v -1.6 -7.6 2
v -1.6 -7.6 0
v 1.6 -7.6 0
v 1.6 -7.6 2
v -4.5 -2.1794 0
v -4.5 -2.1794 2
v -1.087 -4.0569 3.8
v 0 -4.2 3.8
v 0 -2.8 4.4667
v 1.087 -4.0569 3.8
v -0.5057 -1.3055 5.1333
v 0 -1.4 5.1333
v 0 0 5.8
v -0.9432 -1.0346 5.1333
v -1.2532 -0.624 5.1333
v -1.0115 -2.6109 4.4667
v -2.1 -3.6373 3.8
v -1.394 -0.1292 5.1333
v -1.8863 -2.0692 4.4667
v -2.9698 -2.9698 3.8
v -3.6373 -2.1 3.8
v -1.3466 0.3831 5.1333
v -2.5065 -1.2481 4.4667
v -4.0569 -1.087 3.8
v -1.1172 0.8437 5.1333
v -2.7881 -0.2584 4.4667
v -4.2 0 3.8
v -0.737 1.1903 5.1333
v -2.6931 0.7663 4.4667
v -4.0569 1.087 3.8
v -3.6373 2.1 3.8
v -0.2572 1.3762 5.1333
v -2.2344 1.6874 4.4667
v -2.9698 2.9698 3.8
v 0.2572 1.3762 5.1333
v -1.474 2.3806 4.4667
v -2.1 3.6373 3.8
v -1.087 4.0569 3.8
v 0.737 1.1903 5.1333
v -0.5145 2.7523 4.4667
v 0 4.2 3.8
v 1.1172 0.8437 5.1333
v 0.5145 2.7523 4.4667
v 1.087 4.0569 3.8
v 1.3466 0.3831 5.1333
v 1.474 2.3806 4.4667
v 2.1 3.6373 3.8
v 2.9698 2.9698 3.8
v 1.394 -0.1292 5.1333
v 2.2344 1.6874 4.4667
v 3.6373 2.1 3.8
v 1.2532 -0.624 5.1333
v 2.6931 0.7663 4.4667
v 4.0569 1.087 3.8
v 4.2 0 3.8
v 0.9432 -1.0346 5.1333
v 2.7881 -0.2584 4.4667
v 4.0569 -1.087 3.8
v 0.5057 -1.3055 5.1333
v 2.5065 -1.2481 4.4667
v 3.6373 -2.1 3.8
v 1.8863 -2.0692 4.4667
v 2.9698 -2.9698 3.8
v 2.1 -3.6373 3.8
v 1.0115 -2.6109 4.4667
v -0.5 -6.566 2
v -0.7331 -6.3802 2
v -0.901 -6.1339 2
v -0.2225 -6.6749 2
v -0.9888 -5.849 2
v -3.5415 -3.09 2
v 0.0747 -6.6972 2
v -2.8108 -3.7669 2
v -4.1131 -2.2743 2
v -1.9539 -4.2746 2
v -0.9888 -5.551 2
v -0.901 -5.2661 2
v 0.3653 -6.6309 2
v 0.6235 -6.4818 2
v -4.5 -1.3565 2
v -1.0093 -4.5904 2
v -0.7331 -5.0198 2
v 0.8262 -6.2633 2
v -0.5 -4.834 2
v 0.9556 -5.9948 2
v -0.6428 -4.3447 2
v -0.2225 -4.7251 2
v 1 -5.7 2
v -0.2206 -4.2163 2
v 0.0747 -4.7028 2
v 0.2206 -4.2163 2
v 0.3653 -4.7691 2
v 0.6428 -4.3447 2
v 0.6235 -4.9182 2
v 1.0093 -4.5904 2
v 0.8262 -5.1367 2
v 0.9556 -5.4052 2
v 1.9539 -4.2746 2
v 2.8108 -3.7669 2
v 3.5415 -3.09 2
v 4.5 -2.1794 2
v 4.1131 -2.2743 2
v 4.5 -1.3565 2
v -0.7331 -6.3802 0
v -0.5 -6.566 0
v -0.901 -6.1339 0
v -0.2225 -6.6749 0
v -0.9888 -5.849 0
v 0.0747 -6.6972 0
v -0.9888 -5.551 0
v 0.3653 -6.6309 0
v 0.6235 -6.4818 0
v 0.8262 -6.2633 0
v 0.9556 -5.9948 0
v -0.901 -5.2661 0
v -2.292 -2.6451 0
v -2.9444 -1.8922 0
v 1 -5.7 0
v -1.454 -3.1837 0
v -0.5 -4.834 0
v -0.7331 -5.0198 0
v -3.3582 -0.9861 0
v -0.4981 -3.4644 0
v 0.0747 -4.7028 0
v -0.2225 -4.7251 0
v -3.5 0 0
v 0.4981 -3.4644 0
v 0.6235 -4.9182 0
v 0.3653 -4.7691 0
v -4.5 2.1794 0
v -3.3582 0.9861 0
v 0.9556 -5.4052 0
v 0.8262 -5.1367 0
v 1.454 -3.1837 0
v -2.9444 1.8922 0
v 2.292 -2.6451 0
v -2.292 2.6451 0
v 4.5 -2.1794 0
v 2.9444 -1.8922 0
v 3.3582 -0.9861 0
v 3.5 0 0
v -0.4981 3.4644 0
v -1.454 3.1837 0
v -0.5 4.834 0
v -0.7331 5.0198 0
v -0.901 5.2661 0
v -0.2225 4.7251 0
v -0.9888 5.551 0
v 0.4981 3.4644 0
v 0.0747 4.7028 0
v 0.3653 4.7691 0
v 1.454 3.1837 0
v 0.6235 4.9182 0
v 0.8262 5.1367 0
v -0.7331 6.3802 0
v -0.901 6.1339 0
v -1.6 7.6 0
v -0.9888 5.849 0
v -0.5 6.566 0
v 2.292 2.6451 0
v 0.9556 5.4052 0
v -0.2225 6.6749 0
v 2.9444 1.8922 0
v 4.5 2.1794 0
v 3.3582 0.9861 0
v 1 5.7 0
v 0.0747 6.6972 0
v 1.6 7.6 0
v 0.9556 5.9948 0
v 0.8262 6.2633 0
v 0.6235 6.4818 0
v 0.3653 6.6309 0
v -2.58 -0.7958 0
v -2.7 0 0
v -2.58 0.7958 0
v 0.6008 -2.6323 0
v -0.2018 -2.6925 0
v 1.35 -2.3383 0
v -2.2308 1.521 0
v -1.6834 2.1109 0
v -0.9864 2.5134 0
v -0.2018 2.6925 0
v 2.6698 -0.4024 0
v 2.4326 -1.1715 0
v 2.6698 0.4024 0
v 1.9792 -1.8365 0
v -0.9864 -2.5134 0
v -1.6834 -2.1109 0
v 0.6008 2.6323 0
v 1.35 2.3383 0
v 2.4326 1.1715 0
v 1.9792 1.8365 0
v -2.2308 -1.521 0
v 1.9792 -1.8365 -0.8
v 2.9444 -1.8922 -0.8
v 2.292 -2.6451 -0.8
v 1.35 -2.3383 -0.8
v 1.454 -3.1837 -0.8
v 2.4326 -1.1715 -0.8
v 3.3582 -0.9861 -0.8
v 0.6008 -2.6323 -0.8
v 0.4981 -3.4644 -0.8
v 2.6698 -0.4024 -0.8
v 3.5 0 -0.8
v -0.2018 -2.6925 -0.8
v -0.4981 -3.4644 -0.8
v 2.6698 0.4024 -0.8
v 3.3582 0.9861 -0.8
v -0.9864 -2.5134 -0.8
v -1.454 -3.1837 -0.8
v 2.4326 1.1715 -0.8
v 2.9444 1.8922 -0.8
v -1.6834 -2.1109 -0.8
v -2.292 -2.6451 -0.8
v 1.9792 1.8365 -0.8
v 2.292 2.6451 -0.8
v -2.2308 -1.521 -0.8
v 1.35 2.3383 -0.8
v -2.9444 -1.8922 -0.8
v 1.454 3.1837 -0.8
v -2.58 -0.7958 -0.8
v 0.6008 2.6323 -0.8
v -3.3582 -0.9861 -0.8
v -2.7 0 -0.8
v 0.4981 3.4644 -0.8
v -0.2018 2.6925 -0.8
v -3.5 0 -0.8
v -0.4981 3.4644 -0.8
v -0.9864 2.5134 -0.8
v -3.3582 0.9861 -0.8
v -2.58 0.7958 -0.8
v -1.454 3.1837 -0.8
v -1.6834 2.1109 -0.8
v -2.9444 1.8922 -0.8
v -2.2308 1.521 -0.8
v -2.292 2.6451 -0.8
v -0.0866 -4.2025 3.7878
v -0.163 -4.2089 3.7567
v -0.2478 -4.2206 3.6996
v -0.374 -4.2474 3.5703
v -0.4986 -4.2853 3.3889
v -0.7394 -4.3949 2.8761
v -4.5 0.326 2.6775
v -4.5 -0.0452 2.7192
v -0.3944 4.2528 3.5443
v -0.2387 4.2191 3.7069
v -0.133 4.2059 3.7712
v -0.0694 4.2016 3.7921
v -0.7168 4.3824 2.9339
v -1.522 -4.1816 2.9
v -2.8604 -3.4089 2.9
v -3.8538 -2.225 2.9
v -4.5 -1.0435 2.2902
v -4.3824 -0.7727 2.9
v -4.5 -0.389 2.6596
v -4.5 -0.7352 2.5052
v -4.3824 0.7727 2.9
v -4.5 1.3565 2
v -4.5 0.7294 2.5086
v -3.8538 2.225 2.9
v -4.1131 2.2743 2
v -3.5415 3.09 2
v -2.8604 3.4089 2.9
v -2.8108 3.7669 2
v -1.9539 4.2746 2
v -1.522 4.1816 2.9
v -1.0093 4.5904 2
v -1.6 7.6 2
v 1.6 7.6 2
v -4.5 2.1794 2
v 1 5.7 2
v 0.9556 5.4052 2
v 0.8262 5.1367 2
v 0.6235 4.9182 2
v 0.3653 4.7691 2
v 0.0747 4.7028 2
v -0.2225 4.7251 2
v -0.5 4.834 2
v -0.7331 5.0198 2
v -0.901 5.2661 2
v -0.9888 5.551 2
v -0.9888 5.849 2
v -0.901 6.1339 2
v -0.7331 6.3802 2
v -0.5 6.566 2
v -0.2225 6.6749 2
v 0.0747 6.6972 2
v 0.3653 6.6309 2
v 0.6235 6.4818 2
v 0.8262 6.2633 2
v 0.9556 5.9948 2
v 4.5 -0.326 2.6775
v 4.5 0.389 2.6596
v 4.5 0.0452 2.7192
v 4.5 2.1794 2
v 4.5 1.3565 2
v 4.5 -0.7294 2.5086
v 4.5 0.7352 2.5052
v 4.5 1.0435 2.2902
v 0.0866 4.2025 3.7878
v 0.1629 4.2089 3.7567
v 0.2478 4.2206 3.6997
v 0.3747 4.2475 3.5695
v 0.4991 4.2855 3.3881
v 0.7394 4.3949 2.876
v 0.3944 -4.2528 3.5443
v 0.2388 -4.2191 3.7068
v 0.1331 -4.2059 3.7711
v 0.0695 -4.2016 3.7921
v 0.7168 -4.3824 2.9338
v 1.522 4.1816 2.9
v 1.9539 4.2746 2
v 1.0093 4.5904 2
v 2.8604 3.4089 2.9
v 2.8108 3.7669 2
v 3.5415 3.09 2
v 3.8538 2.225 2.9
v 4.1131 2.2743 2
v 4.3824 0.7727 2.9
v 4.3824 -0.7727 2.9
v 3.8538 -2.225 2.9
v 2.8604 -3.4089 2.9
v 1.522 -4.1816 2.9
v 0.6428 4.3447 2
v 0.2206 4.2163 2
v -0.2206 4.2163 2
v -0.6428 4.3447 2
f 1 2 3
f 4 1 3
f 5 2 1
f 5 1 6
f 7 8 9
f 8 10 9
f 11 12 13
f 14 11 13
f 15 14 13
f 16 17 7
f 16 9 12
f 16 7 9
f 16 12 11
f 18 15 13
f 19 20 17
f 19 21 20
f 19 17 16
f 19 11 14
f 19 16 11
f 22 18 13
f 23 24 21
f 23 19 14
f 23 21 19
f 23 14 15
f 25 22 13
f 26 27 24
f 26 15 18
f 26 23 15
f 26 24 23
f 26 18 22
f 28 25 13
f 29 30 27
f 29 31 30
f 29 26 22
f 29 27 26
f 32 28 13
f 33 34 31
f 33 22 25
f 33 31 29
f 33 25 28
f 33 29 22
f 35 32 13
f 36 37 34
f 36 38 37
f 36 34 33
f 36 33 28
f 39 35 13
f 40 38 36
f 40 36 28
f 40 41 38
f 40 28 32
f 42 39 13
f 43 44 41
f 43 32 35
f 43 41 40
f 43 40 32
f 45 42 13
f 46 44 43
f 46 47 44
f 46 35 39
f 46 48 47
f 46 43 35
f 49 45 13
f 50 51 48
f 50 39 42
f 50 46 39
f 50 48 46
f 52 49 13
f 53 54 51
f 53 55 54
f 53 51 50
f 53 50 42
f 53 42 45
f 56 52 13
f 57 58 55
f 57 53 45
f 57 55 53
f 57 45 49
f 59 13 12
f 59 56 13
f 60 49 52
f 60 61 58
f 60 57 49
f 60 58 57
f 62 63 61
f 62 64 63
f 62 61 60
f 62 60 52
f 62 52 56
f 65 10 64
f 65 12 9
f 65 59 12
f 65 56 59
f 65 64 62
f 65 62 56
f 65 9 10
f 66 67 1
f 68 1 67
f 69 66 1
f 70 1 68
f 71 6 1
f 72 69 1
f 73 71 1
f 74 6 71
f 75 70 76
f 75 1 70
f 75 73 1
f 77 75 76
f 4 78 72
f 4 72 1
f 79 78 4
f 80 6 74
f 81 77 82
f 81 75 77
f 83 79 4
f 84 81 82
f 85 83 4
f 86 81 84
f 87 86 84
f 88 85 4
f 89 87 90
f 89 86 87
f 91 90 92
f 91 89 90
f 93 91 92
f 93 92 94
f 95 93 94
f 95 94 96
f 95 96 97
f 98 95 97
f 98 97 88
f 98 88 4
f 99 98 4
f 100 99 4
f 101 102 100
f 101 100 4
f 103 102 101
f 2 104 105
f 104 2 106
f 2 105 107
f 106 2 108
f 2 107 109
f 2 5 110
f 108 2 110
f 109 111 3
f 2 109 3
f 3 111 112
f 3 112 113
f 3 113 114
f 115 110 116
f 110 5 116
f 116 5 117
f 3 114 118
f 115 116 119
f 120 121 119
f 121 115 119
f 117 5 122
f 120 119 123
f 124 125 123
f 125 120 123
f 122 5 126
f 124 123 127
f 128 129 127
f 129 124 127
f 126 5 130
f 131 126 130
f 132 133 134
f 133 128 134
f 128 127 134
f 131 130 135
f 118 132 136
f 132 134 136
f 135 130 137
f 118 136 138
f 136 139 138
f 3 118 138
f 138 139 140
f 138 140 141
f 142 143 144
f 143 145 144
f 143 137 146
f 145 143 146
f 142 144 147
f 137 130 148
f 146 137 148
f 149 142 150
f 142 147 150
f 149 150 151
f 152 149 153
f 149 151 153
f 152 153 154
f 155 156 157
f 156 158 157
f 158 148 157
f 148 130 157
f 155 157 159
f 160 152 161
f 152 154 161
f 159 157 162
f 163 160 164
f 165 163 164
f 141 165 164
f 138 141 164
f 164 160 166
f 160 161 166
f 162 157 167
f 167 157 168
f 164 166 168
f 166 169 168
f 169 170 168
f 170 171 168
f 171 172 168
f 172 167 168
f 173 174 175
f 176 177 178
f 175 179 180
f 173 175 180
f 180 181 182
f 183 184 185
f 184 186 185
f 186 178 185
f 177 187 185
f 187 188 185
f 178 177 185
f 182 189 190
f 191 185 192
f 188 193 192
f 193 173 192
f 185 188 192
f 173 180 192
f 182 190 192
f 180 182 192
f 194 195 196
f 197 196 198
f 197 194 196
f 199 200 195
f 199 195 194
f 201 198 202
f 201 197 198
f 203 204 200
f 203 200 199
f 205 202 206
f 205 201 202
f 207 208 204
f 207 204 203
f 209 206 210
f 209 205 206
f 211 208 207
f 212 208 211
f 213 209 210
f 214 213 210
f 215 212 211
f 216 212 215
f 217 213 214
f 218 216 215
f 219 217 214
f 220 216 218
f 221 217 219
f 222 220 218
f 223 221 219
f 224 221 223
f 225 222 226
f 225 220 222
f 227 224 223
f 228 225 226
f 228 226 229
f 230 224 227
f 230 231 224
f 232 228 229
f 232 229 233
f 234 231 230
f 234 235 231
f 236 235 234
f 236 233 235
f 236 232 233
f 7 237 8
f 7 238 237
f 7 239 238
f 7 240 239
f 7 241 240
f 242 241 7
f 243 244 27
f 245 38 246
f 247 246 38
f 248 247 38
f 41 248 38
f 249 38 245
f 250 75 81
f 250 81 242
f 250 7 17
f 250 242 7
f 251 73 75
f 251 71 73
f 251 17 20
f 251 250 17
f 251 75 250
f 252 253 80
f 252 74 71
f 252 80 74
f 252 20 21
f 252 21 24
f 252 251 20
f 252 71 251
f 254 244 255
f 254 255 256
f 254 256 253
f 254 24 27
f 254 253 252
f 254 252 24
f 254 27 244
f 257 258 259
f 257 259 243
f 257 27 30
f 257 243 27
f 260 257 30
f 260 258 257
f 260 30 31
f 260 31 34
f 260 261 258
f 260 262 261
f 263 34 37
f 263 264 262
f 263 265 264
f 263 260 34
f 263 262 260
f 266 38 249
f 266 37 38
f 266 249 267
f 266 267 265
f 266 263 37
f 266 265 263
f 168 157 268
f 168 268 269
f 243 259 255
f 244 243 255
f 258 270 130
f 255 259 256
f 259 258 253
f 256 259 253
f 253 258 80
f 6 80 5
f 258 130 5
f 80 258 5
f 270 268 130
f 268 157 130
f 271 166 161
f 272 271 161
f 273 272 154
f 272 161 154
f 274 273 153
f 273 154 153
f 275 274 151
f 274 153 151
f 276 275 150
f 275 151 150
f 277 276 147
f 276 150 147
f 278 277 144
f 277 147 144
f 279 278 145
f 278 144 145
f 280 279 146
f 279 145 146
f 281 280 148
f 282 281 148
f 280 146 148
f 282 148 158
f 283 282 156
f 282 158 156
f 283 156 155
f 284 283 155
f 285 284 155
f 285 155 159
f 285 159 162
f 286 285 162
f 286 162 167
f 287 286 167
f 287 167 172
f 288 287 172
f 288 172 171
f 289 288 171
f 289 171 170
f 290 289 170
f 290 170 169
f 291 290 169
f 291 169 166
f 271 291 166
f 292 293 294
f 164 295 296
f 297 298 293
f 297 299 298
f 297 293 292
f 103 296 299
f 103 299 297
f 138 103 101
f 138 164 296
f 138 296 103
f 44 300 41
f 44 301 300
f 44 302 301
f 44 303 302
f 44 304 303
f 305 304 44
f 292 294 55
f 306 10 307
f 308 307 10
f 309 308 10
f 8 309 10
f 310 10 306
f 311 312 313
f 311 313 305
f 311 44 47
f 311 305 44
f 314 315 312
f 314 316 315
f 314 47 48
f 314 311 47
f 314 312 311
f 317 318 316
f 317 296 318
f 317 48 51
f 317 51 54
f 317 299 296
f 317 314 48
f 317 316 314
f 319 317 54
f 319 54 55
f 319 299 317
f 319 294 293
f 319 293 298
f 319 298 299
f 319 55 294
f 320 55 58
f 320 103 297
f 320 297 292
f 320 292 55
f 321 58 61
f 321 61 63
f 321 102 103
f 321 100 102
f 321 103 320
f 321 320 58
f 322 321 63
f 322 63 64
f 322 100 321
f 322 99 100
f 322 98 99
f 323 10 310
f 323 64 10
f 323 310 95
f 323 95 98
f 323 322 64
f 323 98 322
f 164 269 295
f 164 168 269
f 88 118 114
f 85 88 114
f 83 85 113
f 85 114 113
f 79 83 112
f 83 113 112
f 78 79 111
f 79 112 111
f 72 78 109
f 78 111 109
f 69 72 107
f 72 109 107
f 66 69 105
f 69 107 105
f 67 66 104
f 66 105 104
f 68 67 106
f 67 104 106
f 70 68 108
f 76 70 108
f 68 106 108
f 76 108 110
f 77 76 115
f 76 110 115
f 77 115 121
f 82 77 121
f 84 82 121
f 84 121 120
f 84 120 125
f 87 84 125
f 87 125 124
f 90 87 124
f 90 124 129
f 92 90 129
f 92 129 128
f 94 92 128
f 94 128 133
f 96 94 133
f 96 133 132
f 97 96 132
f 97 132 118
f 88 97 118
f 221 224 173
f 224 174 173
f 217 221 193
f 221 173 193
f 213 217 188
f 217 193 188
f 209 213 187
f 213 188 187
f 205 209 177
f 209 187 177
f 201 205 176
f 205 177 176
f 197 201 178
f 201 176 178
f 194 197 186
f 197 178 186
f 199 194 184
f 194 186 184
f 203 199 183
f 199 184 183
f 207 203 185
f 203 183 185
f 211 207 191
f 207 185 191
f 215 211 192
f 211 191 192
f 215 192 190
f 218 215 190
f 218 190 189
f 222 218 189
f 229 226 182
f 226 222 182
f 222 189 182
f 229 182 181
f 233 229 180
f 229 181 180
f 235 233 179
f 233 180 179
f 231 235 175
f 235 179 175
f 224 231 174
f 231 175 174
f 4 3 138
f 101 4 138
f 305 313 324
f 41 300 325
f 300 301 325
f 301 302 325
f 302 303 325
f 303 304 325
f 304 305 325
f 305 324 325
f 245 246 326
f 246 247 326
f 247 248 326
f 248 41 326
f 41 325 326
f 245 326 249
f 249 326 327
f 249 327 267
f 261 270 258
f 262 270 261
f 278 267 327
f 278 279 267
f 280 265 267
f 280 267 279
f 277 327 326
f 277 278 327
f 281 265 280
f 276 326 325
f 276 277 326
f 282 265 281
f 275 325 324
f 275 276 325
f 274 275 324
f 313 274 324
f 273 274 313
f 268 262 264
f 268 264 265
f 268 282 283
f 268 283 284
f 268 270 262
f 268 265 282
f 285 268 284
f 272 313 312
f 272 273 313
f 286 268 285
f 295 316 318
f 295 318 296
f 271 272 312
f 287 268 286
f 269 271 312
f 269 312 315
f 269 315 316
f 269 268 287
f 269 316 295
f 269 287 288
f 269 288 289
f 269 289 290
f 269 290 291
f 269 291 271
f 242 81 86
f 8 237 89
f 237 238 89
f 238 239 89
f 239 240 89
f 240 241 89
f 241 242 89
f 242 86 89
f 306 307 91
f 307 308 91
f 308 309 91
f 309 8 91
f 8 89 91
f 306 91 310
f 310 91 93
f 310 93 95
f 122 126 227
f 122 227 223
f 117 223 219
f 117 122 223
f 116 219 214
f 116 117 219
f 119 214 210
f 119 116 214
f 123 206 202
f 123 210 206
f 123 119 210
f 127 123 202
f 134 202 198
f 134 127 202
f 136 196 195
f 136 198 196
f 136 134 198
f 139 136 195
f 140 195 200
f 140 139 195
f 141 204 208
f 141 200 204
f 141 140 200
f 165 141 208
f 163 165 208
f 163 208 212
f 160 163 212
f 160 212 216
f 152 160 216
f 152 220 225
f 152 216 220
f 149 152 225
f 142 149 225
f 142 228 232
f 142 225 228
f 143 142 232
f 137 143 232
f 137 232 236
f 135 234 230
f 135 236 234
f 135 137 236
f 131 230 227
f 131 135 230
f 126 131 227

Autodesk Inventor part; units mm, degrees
ref_plane "YZ Plane" through (0, 0, 0) normal (1, 0, 0) x (0, 1, 0)
sketch "Sketch1" plane through (0, 0, 0) normal (0, 0, 1) x (1, 0, 0)
  line L0 (-4.5, 0) -> (4.5, 0) construction
  line L1 (0, 7.6) -> (0, -7.6) construction
  line L2 (0, 7.6) -> (-1.6, 7.6)
  line L3 (-1.6, 7.6) -> (-4.5, 2.1794)
  line L4 (-4.5, 2.1794) -> (-4.5, 0)
  arc A0 (0, 5) -> (-4.5, 2.1794) centre (0, 0) ccw construction
  line L5 (0, 7.6) -> (1.6, 7.6)
  line L6 (1.6, 7.6) -> (4.5, 2.1794)
  line L7 (4.5, 2.1794) -> (4.5, 0)
  line L8 (0, -7.6) -> (-1.6, -7.6)
  line L9 (-1.6, -7.6) -> (-4.5, -2.1794)
  line L10 (-4.5, -2.1794) -> (-4.5, 0)
  line L11 (0, -7.6) -> (1.6, -7.6)
  line L12 (1.6, -7.6) -> (4.5, -2.1794)
  line L13 (4.5, -2.1794) -> (4.5, 0)
  point P0 (0, -5)
  dimension "d0" = 3.2
  dimension "d1" = 15.2
  dimension "d2" = 9
  dimension "d3" = 10
extrude "Extrusion1" add sketch "Sketch1" along normal blind 2
sketch "Sketch2" plane through (0, 0, 0) normal (0, 0, 1) x (1, 0, 0)
  circle A0 centre (0, 5.7) radius 1
  circle A1 centre (0, -5.7) radius 1
  line L0 (-6.3, 0) -> (6.3, 0) projected
  point P0 (0, 0)
  dimension "d6" = 2
  dimension "d7" = 11.4
extrude "Extrusion2" cut sketch "Sketch2" along normal through all
sketch "Sketch3" plane through (0, 0, 0) normal (1, 0, 0) x (0, 1, 0)
  line L0 (-6.7, 2) -> (-4.7, 2) projected
  line L1 (-4.7, 2) -> (-4.2, 3.8)
  line L2 (-4.2, 3.8) -> (0, 5.8)
  line L3 (0, 5.8) -> (4.2, 3.8) construction
  line L4 (4.7, 2) -> (6.7, 2) projected
  line L5 (4.2, 3.8) -> (4.7, 2) construction
  line L6 (0, 5.8) -> (0, 2)
  line L7 (2.1794, 2) -> (-2.1794, 2) projected
  line L8 (0, 2) -> (-4.7, 2)
  point P0 (0, 0)
  dimension "d10" = 5.8
  dimension "d11" = 3.8
  dimension "d12" = 8.4
revolve "Revolution1" add sketch "Sketch3" angle 360 about axis through (0, 0, 5.8) along (0, 0, -1)
sketch "Sketch4" plane through (0, 0, 2) normal (0, 0, 1) x (1, 0, 0)
  circle A0 centre (0, -5.7) radius 1 projected
  circle A1 centre (0, -5.7) radius 1.5
  circle A2 centre (0, 5.7) radius 1 projected
  circle A3 centre (0, 5.7) radius 1.5
  point P0 (0, 4.7)
  dimension "d14" = 3
extrude "Extrusion3" cut sketch "Sketch4" along normal through all contours A0 | A1 | A2 | A3
sketch "Sketch5" plane through (0, 0, 0) normal (0, 0, -1) x (-1, 0, 0)
  circle A0 centre (0, 0) radius 3.5
  circle A1 centre (0, 0) radius 2.7
  dimension "d17" = 7
  dimension "d18" = 5.4
extrude "Extrusion4" add sketch "Sketch5" along normal blind 0.8
ref_plane "Work Plane1" through (-4.5, -2.1794, 0) normal (-1, 0, 0) x (0, 0, 1)
split "Split1" plane through (-4.5, -2.1794, 0) removes the side toward (-1, 0, 0)
ref_plane "Work Plane2" through (4.5, -2.1794, 0) normal (1, 0, 0) x (0, 0, -1)
split "Split2" plane through (4.5, -2.1794, 0) removes the side toward (1, 0, 0)
properties part number "b10"
